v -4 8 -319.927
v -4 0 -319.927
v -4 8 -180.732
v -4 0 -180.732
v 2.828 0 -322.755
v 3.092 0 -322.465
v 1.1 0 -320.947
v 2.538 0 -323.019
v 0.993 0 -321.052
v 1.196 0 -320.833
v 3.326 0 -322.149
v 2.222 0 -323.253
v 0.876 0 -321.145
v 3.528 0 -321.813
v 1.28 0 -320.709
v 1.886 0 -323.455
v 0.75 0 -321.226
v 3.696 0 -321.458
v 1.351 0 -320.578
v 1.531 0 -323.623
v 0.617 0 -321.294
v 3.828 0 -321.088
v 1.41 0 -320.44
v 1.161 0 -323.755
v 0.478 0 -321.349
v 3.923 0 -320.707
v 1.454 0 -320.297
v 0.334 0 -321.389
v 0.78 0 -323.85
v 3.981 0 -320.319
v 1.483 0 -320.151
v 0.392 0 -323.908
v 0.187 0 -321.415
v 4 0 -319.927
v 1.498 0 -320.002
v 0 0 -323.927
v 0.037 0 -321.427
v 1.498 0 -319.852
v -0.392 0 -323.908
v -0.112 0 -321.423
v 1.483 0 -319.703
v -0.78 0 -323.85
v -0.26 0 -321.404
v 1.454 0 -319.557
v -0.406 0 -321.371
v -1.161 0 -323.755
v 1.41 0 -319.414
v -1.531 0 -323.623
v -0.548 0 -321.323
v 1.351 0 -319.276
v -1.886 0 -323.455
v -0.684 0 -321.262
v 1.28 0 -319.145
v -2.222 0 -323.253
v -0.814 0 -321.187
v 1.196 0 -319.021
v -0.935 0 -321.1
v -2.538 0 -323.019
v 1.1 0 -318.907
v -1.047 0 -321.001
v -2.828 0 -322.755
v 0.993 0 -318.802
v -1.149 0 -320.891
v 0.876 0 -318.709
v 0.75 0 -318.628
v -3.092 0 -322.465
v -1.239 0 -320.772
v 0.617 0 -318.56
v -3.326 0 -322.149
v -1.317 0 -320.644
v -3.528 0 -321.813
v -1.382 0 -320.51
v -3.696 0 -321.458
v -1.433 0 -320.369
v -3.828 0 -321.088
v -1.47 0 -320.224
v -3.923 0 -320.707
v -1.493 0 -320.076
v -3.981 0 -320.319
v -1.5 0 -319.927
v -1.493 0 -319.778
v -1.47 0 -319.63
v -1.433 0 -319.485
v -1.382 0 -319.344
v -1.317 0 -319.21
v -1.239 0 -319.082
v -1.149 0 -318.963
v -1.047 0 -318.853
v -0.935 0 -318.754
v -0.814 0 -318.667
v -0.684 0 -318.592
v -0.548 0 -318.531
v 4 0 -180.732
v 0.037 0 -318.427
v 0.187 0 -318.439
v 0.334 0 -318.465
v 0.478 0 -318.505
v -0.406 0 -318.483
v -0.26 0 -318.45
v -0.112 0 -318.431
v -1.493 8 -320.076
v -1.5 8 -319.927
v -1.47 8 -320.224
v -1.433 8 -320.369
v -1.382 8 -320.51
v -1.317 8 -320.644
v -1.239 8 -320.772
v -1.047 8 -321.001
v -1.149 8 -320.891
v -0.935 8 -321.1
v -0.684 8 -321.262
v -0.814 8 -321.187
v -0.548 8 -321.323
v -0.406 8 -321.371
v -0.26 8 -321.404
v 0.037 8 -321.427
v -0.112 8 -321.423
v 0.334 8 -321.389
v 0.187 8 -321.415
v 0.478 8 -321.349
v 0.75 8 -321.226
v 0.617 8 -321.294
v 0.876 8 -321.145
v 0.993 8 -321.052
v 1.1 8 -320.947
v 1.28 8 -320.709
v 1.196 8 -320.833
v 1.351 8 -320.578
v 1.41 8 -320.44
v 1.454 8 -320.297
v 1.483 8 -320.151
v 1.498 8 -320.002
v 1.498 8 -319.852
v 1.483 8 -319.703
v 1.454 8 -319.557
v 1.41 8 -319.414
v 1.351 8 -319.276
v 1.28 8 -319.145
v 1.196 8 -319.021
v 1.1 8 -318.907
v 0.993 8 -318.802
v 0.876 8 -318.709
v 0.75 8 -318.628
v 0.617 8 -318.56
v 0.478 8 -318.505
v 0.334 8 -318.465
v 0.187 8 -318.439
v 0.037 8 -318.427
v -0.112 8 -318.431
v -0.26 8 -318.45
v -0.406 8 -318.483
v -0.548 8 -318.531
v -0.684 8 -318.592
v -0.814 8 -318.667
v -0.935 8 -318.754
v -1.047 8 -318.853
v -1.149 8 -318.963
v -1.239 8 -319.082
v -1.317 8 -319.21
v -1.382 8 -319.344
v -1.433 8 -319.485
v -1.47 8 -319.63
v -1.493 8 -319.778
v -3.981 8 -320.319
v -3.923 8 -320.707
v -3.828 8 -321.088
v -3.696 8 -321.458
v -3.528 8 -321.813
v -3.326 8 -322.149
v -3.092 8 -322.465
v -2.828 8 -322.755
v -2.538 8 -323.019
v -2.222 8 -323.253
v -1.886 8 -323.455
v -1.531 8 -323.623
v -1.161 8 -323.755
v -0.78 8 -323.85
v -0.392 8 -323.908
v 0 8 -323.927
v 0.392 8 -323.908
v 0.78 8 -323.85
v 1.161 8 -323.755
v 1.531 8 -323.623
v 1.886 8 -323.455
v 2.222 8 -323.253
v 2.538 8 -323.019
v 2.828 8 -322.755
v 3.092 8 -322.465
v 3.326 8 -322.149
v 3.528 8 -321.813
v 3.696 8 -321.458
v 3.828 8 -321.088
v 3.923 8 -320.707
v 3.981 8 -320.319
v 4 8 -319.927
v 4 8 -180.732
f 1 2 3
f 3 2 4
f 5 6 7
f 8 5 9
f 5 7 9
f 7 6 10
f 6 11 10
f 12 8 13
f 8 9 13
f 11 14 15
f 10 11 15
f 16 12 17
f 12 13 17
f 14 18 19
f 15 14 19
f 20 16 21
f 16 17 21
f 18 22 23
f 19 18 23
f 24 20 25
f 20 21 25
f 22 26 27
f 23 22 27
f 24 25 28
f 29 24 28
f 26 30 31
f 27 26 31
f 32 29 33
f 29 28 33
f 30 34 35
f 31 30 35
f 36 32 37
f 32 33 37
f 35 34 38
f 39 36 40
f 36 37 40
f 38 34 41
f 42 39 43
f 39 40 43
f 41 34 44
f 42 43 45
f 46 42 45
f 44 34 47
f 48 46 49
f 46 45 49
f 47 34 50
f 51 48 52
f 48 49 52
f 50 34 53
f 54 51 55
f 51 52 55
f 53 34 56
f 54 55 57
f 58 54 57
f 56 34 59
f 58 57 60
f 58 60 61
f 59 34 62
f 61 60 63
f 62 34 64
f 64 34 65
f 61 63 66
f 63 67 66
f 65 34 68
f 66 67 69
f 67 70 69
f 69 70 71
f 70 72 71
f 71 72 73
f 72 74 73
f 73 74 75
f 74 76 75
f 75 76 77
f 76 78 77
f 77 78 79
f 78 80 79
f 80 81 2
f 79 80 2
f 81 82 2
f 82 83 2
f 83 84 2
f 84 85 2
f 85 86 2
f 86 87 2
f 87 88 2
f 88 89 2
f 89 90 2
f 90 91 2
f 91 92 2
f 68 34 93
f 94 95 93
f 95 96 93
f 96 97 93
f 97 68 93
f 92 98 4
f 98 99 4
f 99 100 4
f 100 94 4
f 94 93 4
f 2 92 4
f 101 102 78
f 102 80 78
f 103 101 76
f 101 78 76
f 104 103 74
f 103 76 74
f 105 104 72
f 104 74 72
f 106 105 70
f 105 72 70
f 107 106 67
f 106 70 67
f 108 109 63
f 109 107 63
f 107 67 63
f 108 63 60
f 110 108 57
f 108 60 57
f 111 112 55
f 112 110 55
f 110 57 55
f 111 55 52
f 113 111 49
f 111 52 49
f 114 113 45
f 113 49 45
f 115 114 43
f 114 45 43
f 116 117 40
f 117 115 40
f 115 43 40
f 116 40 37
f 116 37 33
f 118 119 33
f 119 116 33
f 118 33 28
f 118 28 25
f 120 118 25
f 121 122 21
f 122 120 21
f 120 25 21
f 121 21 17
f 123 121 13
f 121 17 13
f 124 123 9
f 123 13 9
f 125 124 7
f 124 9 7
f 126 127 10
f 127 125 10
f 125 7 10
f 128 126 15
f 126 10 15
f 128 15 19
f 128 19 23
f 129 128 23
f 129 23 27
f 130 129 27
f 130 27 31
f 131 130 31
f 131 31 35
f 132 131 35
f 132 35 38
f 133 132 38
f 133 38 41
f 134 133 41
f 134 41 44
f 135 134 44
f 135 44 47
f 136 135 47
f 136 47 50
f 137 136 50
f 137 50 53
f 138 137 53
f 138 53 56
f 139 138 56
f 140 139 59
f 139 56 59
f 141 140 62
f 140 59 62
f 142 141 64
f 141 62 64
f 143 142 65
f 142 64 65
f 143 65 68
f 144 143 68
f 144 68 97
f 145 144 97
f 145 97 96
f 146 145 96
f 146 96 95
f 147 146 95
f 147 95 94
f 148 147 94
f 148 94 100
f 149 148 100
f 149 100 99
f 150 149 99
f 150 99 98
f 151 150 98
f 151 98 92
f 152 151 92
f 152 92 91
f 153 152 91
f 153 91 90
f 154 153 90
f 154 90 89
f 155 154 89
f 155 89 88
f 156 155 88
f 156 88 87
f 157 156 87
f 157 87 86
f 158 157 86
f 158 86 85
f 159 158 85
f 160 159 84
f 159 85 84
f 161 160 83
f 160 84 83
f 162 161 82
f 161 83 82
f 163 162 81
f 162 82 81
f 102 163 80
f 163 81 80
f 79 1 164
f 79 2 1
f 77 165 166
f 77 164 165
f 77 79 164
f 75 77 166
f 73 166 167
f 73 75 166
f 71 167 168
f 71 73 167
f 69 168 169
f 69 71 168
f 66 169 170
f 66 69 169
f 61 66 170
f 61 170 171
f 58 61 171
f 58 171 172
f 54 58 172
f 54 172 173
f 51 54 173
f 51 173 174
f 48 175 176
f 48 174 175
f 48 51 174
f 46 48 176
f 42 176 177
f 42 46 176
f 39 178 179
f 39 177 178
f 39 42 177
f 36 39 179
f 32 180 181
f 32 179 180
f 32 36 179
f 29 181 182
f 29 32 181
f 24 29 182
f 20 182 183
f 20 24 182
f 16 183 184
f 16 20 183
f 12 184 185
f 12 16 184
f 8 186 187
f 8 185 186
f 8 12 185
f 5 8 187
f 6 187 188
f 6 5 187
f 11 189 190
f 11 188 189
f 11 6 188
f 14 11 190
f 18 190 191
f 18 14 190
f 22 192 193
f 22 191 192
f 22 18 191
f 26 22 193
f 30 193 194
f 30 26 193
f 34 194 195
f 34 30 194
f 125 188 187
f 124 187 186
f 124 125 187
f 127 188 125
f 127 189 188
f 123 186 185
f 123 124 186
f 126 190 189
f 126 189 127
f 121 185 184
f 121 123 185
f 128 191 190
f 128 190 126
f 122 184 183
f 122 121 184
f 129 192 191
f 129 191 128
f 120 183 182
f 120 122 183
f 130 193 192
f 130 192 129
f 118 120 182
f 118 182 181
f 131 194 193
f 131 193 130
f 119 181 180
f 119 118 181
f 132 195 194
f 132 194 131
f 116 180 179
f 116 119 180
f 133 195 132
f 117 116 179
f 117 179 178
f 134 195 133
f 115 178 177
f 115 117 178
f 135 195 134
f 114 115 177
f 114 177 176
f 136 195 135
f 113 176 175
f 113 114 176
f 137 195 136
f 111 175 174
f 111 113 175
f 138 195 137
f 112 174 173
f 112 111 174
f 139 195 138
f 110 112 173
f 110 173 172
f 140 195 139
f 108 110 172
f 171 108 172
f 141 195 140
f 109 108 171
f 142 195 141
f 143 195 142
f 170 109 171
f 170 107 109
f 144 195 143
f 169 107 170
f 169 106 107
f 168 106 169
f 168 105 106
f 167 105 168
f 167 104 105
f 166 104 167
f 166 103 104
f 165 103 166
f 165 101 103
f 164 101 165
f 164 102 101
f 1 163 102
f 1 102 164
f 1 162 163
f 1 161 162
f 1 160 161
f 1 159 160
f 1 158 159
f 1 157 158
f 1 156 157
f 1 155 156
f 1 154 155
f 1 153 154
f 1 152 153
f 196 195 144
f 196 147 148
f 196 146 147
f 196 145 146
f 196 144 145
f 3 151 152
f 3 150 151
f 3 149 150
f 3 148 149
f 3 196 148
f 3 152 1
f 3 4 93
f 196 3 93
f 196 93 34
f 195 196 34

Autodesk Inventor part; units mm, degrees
ref_plane "XZ Plane" through (0, 0, 0) normal (0, 1, 0) x (-1, 0, 0)
ref_plane "XY Plane" through (0, 0, 0) normal (0, 0, 1) x (1, 0, 0)
sketch "Sketch1" plane through (0, 0, 0) normal (0, 1, 0) x (-1, 0, 0)
  line L0 (0, 0) -> (0, -319.927) construction
  line L1 (-4, 0) -> (-4, -319.927)
  line L2 (4, -319.927) -> (4, 0)
  arc A0 (4, 0) -> (-4, 0) centre (0, 0) ccw
  arc A1 (-4, -319.927) -> (4, -319.927) centre (0, -319.927) ccw
  circle A2 centre (0, 0) radius 1.5
  circle A3 centre (0, -319.927) radius 1.5
  line L3 (0, -50.8) -> (0, -100) construction
  line L4 (-1.5, -50.8) -> (-1.5, -100)
  line L5 (1.5, -100) -> (1.5, -50.8)
  arc A4 (1.5, -50.8) -> (-1.5, -50.8) centre (0, -50.8) ccw
  arc A5 (-1.5, -100) -> (1.5, -100) centre (0, -100) ccw
  arc A6 (4, 0) -> (4, -40) centre (202.9975, -20) ccw
  arc A7 (-4, 0) -> (-4, -40) centre (194.9975, -20) ccw
  point P0 (0, -159.9635)
  point P1 (0, -75.4)
  dimension "d0" = 319.927
  dimension "d1" = 8
  dimension "d2" = 3
  dimension "d3" = 3
  dimension "d12" = 3
  dimension "d13" = 50.8
  dimension "d14" = 100
  dimension "d15" = 40
  dimension "d16" = 200
  dimension "d17" = 200
extrude "Extrusion1" add sketch "Sketch1" along normal blind 8 contours A0 A6 L2 A1 L1 | L1 A7
sketch "Sketch2" plane through (0, 0, 0) normal (0, -1, 0) x (1, 0, 0)
  arc A0 (4, -40) -> (4, 0) centre (-194.9975, -20) ccw projected
  arc A1 (4, 0) -> (-4, 0) centre (0, 0) ccw projected
  arc A2 (-4, -40) -> (-4, 0) centre (-202.9975, -20) ccw projected
  line L0 (-4, -319.927) -> (-4, -40) projected
  arc A3 (-4, -319.927) -> (4, -319.927) centre (0, -319.927) ccw projected
  line L1 (4, -40) -> (4, -319.927) projected
  circle A4 centre (0, 0) radius 1.5 projected
  circle A5 centre (0, -319.927) radius 1.5 projected
  arc A6 (1.5, -50.8) -> (-1.5, -50.8) centre (0, -50.8) ccw projected
  line L2 (1.5, -100) -> (1.5, -50.8) projected
  arc A7 (-1.5, -100) -> (1.5, -100) centre (0, -100) ccw projected
  line L3 (-1.5, -50.8) -> (-1.5, -100) projected
sketch "Sketch3" plane through (0, 8, 0) normal (0, 1, 0) x (1, 0, 0)
  line L0 (-21.634, 180.7321) -> (39.8396, 180.7321)
  line L1 (39.8396, 180.7321) -> (39.8396, -20.7362)
  line L2 (39.8396, -20.7362) -> (-21.634, -20.7362)
  line L3 (-21.634, -20.7362) -> (-21.634, 180.7321)
  line L4 (-50.5628, 342.9399) -> (62.0528, 342.9399)
  line L5 (62.0528, 342.9399) -> (62.0528, -55.3474)
  line L6 (62.0528, -55.3474) -> (-50.5628, -55.3474)
  line L7 (-50.5628, -55.3474) -> (-50.5628, 342.9399)
  point P0 (0, 0)
extrude "Extrusion2" cut sketch "Sketch3" along normal mid plane 20 contours L0 L1 L2 L3
sketch "Sketch4" plane through (0, 8, 0) normal (0, 1, 0) x (1, 0, 0)
  line L0 (-4, 180.7321) -> (4, 180.7321) projected
  line L1 (-4, 319.927) -> (-4, 180.7321) projected
  line L2 (4, 180.7321) -> (4, 319.927) projected
  arc A0 (4, 319.927) -> (-4, 319.927) centre (0, 319.927) ccw projected
  point P0 (0, 0)
properties part number "Part_8_p2"
